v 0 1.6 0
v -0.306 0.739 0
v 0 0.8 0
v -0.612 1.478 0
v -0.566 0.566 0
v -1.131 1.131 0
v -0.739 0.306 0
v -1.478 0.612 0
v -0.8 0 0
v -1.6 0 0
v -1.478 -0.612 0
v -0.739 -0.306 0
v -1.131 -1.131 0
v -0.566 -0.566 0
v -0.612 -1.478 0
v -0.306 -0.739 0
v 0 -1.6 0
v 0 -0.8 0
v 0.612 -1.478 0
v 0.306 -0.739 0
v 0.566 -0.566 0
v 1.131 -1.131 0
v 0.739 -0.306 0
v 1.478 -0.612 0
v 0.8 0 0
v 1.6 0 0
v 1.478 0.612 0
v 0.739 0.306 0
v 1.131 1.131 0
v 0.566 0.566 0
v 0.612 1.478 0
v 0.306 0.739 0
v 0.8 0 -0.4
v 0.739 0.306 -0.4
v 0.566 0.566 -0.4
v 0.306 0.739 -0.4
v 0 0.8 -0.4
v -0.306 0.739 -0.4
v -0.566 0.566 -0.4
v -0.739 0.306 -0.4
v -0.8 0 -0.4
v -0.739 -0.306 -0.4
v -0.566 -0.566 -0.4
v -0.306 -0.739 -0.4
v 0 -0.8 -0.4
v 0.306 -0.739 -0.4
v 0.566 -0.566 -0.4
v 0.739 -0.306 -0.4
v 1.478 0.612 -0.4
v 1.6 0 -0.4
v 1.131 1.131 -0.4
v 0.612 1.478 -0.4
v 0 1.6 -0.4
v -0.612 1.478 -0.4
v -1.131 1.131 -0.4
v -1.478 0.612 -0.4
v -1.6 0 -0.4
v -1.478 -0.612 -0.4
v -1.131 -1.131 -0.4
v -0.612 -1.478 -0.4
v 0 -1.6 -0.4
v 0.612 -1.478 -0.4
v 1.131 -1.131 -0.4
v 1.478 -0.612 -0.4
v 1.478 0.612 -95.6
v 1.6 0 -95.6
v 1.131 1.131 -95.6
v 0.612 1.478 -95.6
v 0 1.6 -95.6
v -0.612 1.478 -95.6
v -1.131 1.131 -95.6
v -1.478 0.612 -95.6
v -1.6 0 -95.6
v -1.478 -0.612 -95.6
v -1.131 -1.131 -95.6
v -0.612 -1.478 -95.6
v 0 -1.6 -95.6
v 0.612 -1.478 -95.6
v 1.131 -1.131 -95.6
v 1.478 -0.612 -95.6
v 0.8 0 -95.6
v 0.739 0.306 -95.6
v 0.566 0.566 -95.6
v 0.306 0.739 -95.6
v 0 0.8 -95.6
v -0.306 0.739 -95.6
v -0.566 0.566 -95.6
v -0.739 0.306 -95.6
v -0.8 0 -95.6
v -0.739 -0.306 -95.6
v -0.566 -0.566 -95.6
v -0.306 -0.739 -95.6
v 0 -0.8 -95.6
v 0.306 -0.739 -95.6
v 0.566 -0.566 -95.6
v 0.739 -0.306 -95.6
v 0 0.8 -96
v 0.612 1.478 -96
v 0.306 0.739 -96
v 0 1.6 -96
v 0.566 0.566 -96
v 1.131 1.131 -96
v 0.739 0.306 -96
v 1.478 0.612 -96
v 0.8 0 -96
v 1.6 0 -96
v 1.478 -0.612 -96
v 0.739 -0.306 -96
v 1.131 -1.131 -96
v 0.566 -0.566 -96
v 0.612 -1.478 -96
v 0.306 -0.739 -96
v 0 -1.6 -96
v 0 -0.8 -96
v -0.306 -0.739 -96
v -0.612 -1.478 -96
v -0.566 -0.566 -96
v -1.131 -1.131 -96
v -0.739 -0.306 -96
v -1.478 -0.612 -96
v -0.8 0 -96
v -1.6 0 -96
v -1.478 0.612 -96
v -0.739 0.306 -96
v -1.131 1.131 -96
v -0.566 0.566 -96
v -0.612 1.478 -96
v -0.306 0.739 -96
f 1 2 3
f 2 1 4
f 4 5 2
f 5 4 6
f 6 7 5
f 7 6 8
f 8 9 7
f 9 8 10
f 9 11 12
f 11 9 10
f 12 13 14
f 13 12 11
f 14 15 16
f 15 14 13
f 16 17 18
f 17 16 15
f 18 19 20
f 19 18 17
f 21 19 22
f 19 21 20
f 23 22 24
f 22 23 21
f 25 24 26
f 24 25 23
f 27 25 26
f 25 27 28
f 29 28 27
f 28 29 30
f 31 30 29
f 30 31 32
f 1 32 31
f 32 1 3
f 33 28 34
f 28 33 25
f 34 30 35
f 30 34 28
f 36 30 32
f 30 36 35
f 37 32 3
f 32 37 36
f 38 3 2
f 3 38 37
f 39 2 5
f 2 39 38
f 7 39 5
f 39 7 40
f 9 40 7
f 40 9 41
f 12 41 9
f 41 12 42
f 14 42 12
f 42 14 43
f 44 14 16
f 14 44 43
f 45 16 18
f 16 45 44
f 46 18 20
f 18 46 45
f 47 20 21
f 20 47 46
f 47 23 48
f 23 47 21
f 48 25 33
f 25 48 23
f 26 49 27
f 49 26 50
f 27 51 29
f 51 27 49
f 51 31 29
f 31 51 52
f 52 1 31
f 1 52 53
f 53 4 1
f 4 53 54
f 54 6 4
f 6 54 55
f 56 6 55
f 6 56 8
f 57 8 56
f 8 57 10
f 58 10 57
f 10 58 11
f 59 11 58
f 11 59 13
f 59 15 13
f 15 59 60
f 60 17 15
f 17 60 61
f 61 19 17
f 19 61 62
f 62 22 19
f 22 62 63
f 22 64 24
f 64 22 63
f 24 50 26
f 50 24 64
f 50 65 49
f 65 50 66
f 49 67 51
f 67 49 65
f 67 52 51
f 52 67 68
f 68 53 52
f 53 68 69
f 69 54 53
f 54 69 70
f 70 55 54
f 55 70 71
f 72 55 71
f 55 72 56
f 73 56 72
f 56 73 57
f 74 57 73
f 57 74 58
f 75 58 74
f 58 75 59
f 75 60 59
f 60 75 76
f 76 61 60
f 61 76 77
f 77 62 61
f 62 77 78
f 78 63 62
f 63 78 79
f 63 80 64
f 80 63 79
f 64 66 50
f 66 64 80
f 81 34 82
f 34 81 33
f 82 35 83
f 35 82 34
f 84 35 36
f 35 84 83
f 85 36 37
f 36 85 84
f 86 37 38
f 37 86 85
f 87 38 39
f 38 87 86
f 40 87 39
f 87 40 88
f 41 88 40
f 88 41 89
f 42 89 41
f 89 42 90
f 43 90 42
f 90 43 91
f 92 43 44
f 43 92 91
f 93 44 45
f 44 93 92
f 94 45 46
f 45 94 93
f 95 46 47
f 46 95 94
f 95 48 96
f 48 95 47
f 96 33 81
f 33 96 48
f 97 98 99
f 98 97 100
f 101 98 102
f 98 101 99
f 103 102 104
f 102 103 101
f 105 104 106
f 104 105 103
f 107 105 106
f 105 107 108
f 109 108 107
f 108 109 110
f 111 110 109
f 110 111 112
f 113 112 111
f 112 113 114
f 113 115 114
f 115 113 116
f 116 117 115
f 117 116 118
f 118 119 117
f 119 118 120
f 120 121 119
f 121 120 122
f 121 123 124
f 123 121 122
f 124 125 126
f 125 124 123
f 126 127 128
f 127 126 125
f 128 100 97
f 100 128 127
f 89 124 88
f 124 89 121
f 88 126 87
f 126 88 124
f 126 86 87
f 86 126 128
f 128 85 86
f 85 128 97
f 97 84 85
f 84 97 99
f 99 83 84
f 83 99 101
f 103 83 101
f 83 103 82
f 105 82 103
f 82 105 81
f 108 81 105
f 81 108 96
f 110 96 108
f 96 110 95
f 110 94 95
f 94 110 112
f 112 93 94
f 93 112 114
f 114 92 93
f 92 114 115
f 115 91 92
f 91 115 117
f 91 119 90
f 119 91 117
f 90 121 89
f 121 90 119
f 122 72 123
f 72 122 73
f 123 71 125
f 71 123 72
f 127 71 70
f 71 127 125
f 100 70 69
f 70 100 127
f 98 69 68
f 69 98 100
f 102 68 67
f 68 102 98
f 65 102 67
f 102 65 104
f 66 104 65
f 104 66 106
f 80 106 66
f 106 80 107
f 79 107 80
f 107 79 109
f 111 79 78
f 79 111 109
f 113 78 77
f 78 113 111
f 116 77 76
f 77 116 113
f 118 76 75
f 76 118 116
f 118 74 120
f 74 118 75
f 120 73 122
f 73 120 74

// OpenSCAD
// file: ../p/4-4ring1.scad
use <../lib.scad>
function ldraw_lib__4_4ring1() = [
// 0 Ring  1 x 1.0
// 0 Name: 4-4ring1.dat
// 0 Author: James Jessiman
// 0 !LDRAW_ORG Primitive UPDATE 2009-01
// 0 !LICENSE Licensed under CC BY 2.0 and CC BY 4.0 : see CAreadme.txt
// 
// 0 BFC CERTIFY CCW
  [0,"BFC","CERTIFY"],
  [0,"BFC","CCW"],
// 
// 0 !HISTORY 1998-12-15 [PTadmin] Official Update 1998-10
// 0 !HISTORY 2002-04-08 [BrickCaster] Modified for BFC compliance
// 0 !HISTORY 2002-04-25 [PTadmin] Official Update 2002-02
// 0 !HISTORY 2007-06-24 [PTadmin] Header formatted for Contributor Agreement
// 0 !HISTORY 2008-07-01 [PTadmin] Official Update 2008-01
// 0 !HISTORY 2008-08-26 [cwdee] Switch polygon winding and rename
// 0 !HISTORY 2009-05-02 [PTadmin] Official Update 2009-01
// 
// 
// 4 16 -0.7654 0 1.8478 -0.3827 0 0.9239 0 0 1 0 0 2
  [4,16,-0.7654,0,1.8478,-0.3827,0,0.9239,0,0,1,0,0,2],
// 4 16 -1.4142 0 1.4142 -0.7071 0 0.7071 -0.3827 0 0.9239 -0.7654 0 1.8478
  [4,16,-1.4142,0,1.4142,-0.7071,0,0.7071,-0.3827,0,0.9239,-0.7654,0,1.8478],
// 4 16 -1.8478 0 0.7654 -0.9239 0 0.3827 -0.7071 0 0.7071 -1.4142 0 1.41420
  [4,16,-1.8478,0,0.7654,-0.9239,0,0.3827,-0.7071,0,0.7071,-1.4142,0,1.41420],
// 4 16 -2 0 0 -1 0 0 -0.9239 0 0.3827 -1.8478 0 0.7654
  [4,16,-2,0,0,-1,0,0,-0.9239,0,0.3827,-1.8478,0,0.7654],
// 4 16 -1.8478 0 -0.7654 -0.9239 0 -0.3827 -1 0 0 -2 0 0
  [4,16,-1.8478,0,-0.7654,-0.9239,0,-0.3827,-1,0,0,-2,0,0],
// 4 16 -1.4142 0 -1.4142 -0.7071 0 -0.7071 -0.9239 0 -0.3827 -1.8478 0 -0.7654
  [4,16,-1.4142,0,-1.4142,-0.7071,0,-0.7071,-0.9239,0,-0.3827,-1.8478,0,-0.7654],
// 4 16 -0.7654 0 -1.8478 -0.3827 0 -0.9239 -0.7071 0 -0.7071 -1.4142 0 -1.4142
  [4,16,-0.7654,0,-1.8478,-0.3827,0,-0.9239,-0.7071,0,-0.7071,-1.4142,0,-1.4142],
// 4 16 0 0 -2 0 0 -1 -0.3827 0 -0.9239 -0.7654 0 -1.8478
  [4,16,0,0,-2,0,0,-1,-0.3827,0,-0.9239,-0.7654,0,-1.8478],
// 4 16 0.7654 0 -1.8478 0.3827 0 -0.9239 0 0 -1 0 0 -2
  [4,16,0.7654,0,-1.8478,0.3827,0,-0.9239,0,0,-1,0,0,-2],
// 4 16 1.4142 0 -1.4142 0.7071 0 -0.7071 0.3827 0 -0.9239 0.7654 0 -1.8478
  [4,16,1.4142,0,-1.4142,0.7071,0,-0.7071,0.3827,0,-0.9239,0.7654,0,-1.8478],
// 4 16 1.8478 0 -0.7654 0.9239 0 -0.3827 0.7071 0 -0.7071 1.4142 0 -1.4142
  [4,16,1.8478,0,-0.7654,0.9239,0,-0.3827,0.7071,0,-0.7071,1.4142,0,-1.4142],
// 4 16 2 0 0 1 0 0 0.9239 0 -0.3827 1.8478 0 -0.7654
  [4,16,2,0,0,1,0,0,0.9239,0,-0.3827,1.8478,0,-0.7654],
// 4 16 1.8478 0 0.7654 0.9239 0 0.3827 1 0 0 2 0 0
  [4,16,1.8478,0,0.7654,0.9239,0,0.3827,1,0,0,2,0,0],
// 4 16 1.4142 0 1.4142 0.7071 0 0.7071 0.9239 0 0.3827 1.8478 0 0.7654
  [4,16,1.4142,0,1.4142,0.7071,0,0.7071,0.9239,0,0.3827,1.8478,0,0.7654],
// 4 16 0.7654 0 1.8478 0.3827 0 0.9239 0.7071 0 0.7071 1.4142 0 1.4142
  [4,16,0.7654,0,1.8478,0.3827,0,0.9239,0.7071,0,0.7071,1.4142,0,1.4142],
// 4 16 0 0 2 0 0 1 0.3827 0 0.9239 0.7654 0 1.8478
  [4,16,0,0,2,0,0,1,0.3827,0,0.9239,0.7654,0,1.8478],
// 0
];
module ldraw_lib__4_4ring1(step=0, col=false, unit=2/5, alt=false, line=0.2, solid=!$preview)
    makepoly(ldraw_lib__4_4ring1(), step=step, col=col, unit=unit, alt=alt, line=line, solid=solid);
ldraw_lib__4_4ring1(line=0.2);
// file: ../p/4-4edge.scad
use <../lib.scad>
function ldraw_lib__4_4edge() = [
// 0 Circle 1.0
// 0 Name: 4-4edge.dat
// 0 Author: James Jessiman
// 0 !LDRAW_ORG Primitive UPDATE 2017-01
// 0 !LICENSE Licensed under CC BY 2.0 and CC BY 4.0 : see CAreadme.txt
// 
// 0 BFC CERTIFY CCW
  [0,"BFC","CERTIFY"],
  [0,"BFC","CCW"],
// 
// 0 !HISTORY 1998-12-15 [PTadmin] Official Update 1998-10
// 0 !HISTORY 2005-12-28 [PTadmin] Official Update 2005-01
// 0 !HISTORY 2007-06-24 [PTadmin] Header formatted for Contributor Agreement
// 0 !HISTORY 2008-07-01 [PTadmin] Official Update 2008-01
// 0 !HISTORY 2017-01-15 [Steffen] BFCed
// 0 !HISTORY 2017-12-30 [PTadmin] Official Update 2017-01
// 
// 
// 2 24 1 0 0 0.9239 0 0.3827
  [2,24,1,0,0,0.9239,0,0.3827],
// 2 24 0.9239 0 0.3827 0.7071 0 0.7071
  [2,24,0.9239,0,0.3827,0.7071,0,0.7071],
// 2 24 0.7071 0 0.7071 0.3827 0 0.9239
  [2,24,0.7071,0,0.7071,0.3827,0,0.9239],
// 2 24 0.3827 0 0.9239 0 0 1
  [2,24,0.3827,0,0.9239,0,0,1],
// 2 24 0 0 1 -0.3827 0 0.9239
  [2,24,0,0,1,-0.3827,0,0.9239],
// 2 24 -0.3827 0 0.9239 -0.7071 0 0.7071
  [2,24,-0.3827,0,0.9239,-0.7071,0,0.7071],
// 2 24 -0.7071 0 0.7071 -0.9239 0 0.3827
  [2,24,-0.7071,0,0.7071,-0.9239,0,0.3827],
// 2 24 -0.9239 0 0.3827 -1 0 -0
  [2,24,-0.9239,0,0.3827,-1,0,-0],
// 2 24 -1 0 -0 -0.9239 0 -0.3827
  [2,24,-1,0,-0,-0.9239,0,-0.3827],
// 2 24 -0.9239 0 -0.3827 -0.7071 0 -0.7071
  [2,24,-0.9239,0,-0.3827,-0.7071,0,-0.7071],
// 2 24 -0.7071 0 -0.7071 -0.3827 0 -0.9239
  [2,24,-0.7071,0,-0.7071,-0.3827,0,-0.9239],
// 2 24 -0.3827 0 -0.9239 0 0 -1
  [2,24,-0.3827,0,-0.9239,0,0,-1],
// 2 24 0 0 -1 0.3827 0 -0.9239
  [2,24,0,0,-1,0.3827,0,-0.9239],
// 2 24 0.3827 0 -0.9239 0.7071 0 -0.7071
  [2,24,0.3827,0,-0.9239,0.7071,0,-0.7071],
// 2 24 0.7071 0 -0.7071 0.9239 0 -0.3827
  [2,24,0.7071,0,-0.7071,0.9239,0,-0.3827],
// 2 24 0.9239 0 -0.3827 1 0 0
  [2,24,0.9239,0,-0.3827,1,0,0],
];
module ldraw_lib__4_4edge(step=0, col=false, unit=2/5, alt=false, line=0.2, solid=!$preview)
    makepoly(ldraw_lib__4_4edge(), step=step, col=col, unit=unit, alt=alt, line=line, solid=solid);
ldraw_lib__4_4edge(line=0.2);
// file: ../p/4-4cyli.scad
use <../lib.scad>
function ldraw_lib__4_4cyli() = [
// 0 Cylinder 1.0
// 0 Name: 4-4cyli.dat
// 0 Author: James Jessiman
// 0 !LDRAW_ORG Primitive UPDATE 2005-01
// 0 !LICENSE Licensed under CC BY 2.0 and CC BY 4.0 : see CAreadme.txt
// 
// 0 BFC CERTIFY CCW
  [0,"BFC","CERTIFY"],
  [0,"BFC","CCW"],
// 
// 0 !HISTORY 1998-12-15 [PTadmin] Official Update 1998-10
// 0 !HISTORY 2002-03-23 [sbliss] Added BFC statement; merged headers from files in distributions LDraw 0.27 and Complete.
// 0 !HISTORY 2002-04-25 [PTadmin] Official Update 2002-02
// 0 !HISTORY 2004-12-14 [guyvivan] BFC CCW
// 0 !HISTORY 2005-12-28 [PTadmin] Official Update 2005-01
// 0 !HISTORY 2007-06-24 [PTadmin] Header formatted for Contributor Agreement
// 0 !HISTORY 2008-07-01 [PTadmin] Official Update 2008-01
// 
// 
// 4 16 1 1 0 0.9239 1 0.3827 0.9239 0 0.3827 1 0 0
  [4,16,1,1,0,0.9239,1,0.3827,0.9239,0,0.3827,1,0,0],
// 5 24 1 0 0 1 1 0 0.9239 0 0.3827 0.9239 0 -0.3827
  [5,24,1,0,0,1,1,0,0.9239,0,0.3827,0.9239,0,-0.3827],
// 4 16 0.9239 1 0.3827 0.7071 1 0.7071 0.7071 0 0.7071 0.9239 0 0.3827
  [4,16,0.9239,1,0.3827,0.7071,1,0.7071,0.7071,0,0.7071,0.9239,0,0.3827],
// 5 24 0.9239 0 0.3827 0.9239 1 0.3827 0.7071 0 0.7071 1 0 0
  [5,24,0.9239,0,0.3827,0.9239,1,0.3827,0.7071,0,0.7071,1,0,0],
// 4 16 0.7071 1 0.7071 0.3827 1 0.9239 0.3827 0 0.9239 0.7071 0 0.7071
  [4,16,0.7071,1,0.7071,0.3827,1,0.9239,0.3827,0,0.9239,0.7071,0,0.7071],
// 5 24 0.7071 0 0.7071 0.7071 1 0.7071 0.3827 0 0.9239 0.9239 0 0.3827
  [5,24,0.7071,0,0.7071,0.7071,1,0.7071,0.3827,0,0.9239,0.9239,0,0.3827],
// 4 16 0.3827 1 0.9239 0 1 1 0 0 1 0.3827 0 0.9239
  [4,16,0.3827,1,0.9239,0,1,1,0,0,1,0.3827,0,0.9239],
// 5 24 0.3827 0 0.9239 0.3827 1 0.9239 0 0 1 0.7071 0 0.7071
  [5,24,0.3827,0,0.9239,0.3827,1,0.9239,0,0,1,0.7071,0,0.7071],
// 4 16 0 1 1 -0.3827 1 0.9239 -0.3827 0 0.9239 0 0 1
  [4,16,0,1,1,-0.3827,1,0.9239,-0.3827,0,0.9239,0,0,1],
// 5 24 0 0 1 0 1 1 -0.3827 0 0.9239 0.3827 0 0.9239
  [5,24,0,0,1,0,1,1,-0.3827,0,0.9239,0.3827,0,0.9239],
// 4 16 -0.3827 1 0.9239 -0.7071 1 0.7071 -0.7071 0 0.7071 -0.3827 0 0.9239
  [4,16,-0.3827,1,0.9239,-0.7071,1,0.7071,-0.7071,0,0.7071,-0.3827,0,0.9239],
// 5 24 -0.3827 0 0.9239 -0.3827 1 0.9239 -0.7071 0 0.7071 0 0 1
  [5,24,-0.3827,0,0.9239,-0.3827,1,0.9239,-0.7071,0,0.7071,0,0,1],
// 4 16 -0.7071 1 0.7071 -0.9239 1 0.3827 -0.9239 0 0.3827 -0.7071 0 0.7071
  [4,16,-0.7071,1,0.7071,-0.9239,1,0.3827,-0.9239,0,0.3827,-0.7071,0,0.7071],
// 5 24 -0.7071 0 0.7071 -0.7071 1 0.7071 -0.9239 0 0.3827 -0.3827 0 0.9239
  [5,24,-0.7071,0,0.7071,-0.7071,1,0.7071,-0.9239,0,0.3827,-0.3827,0,0.9239],
// 4 16 -0.9239 1 0.3827 -1 1 0 -1 0 0 -0.9239 0 0.3827
  [4,16,-0.9239,1,0.3827,-1,1,0,-1,0,0,-0.9239,0,0.3827],
// 5 24 -0.9239 0 0.3827 -0.9239 1 0.3827 -1 0 0 -0.7071 0 0.7071
  [5,24,-0.9239,0,0.3827,-0.9239,1,0.3827,-1,0,0,-0.7071,0,0.7071],
// 4 16 -1 1 0 -0.9239 1 -0.3827 -0.9239 0 -0.3827 -1 0 0
  [4,16,-1,1,0,-0.9239,1,-0.3827,-0.9239,0,-0.3827,-1,0,0],
// 5 24 -1 0 0 -1 1 0 -0.9239 0 -0.3827 -0.9239 0 0.3827
  [5,24,-1,0,0,-1,1,0,-0.9239,0,-0.3827,-0.9239,0,0.3827],
// 4 16 -0.9239 1 -0.3827 -0.7071 1 -0.7071 -0.7071 0 -0.7071 -0.9239 0 -0.3827
  [4,16,-0.9239,1,-0.3827,-0.7071,1,-0.7071,-0.7071,0,-0.7071,-0.9239,0,-0.3827],
// 5 24 -0.9239 0 -0.3827 -0.9239 1 -0.3827 -0.7071 0 -0.7071 -1 0 0
  [5,24,-0.9239,0,-0.3827,-0.9239,1,-0.3827,-0.7071,0,-0.7071,-1,0,0],
// 4 16 -0.7071 1 -0.7071 -0.3827 1 -0.9239 -0.3827 0 -0.9239 -0.7071 0 -0.7071
  [4,16,-0.7071,1,-0.7071,-0.3827,1,-0.9239,-0.3827,0,-0.9239,-0.7071,0,-0.7071],
// 5 24 -0.7071 0 -0.7071 -0.7071 1 -0.7071 -0.3827 0 -0.9239 -0.9239 0 -0.3827
  [5,24,-0.7071,0,-0.7071,-0.7071,1,-0.7071,-0.3827,0,-0.9239,-0.9239,0,-0.3827],
// 4 16 -0.3827 1 -0.9239 0 1 -1 0 0 -1 -0.3827 0 -0.9239
  [4,16,-0.3827,1,-0.9239,0,1,-1,0,0,-1,-0.3827,0,-0.9239],
// 5 24 -0.3827 0 -0.9239 -0.3827 1 -0.9239 0 0 -1 -0.7071 0 -0.7071
  [5,24,-0.3827,0,-0.9239,-0.3827,1,-0.9239,0,0,-1,-0.7071,0,-0.7071],
// 4 16 0 1 -1 0.3827 1 -0.9239 0.3827 0 -0.9239 0 0 -1
  [4,16,0,1,-1,0.3827,1,-0.9239,0.3827,0,-0.9239,0,0,-1],
// 5 24 0 0 -1 0 1 -1 0.3827 0 -0.9239 -0.3827 0 -0.9239
  [5,24,0,0,-1,0,1,-1,0.3827,0,-0.9239,-0.3827,0,-0.9239],
// 4 16 0.3827 1 -0.9239 0.7071 1 -0.7071 0.7071 0 -0.7071 0.3827 0 -0.9239
  [4,16,0.3827,1,-0.9239,0.7071,1,-0.7071,0.7071,0,-0.7071,0.3827,0,-0.9239],
// 5 24 0.3827 0 -0.9239 0.3827 1 -0.9239 0.7071 0 -0.7071 0 0 -1
  [5,24,0.3827,0,-0.9239,0.3827,1,-0.9239,0.7071,0,-0.7071,0,0,-1],
// 4 16 0.7071 1 -0.7071 0.9239 1 -0.3827 0.9239 0 -0.3827 0.7071 0 -0.7071
  [4,16,0.7071,1,-0.7071,0.9239,1,-0.3827,0.9239,0,-0.3827,0.7071,0,-0.7071],
// 5 24 0.7071 0 -0.7071 0.7071 1 -0.7071 0.9239 0 -0.3827 0.3827 0 -0.9239
  [5,24,0.7071,0,-0.7071,0.7071,1,-0.7071,0.9239,0,-0.3827,0.3827,0,-0.9239],
// 4 16 0.9239 1 -0.3827 1 1 0 1 0 0 0.9239 0 -0.3827
  [4,16,0.9239,1,-0.3827,1,1,0,1,0,0,0.9239,0,-0.3827],
// 5 24 0.9239 0 -0.3827 0.9239 1 -0.3827 1 0 0 0.7071 0 -0.7071
  [5,24,0.9239,0,-0.3827,0.9239,1,-0.3827,1,0,0,0.7071,0,-0.7071],
// 0
];
module ldraw_lib__4_4cyli(step=0, col=false, unit=2/5, alt=false, line=0.2, solid=!$preview)
    makepoly(ldraw_lib__4_4cyli(), step=step, col=col, unit=unit, alt=alt, line=line, solid=solid);
ldraw_lib__4_4cyli(line=0.2);
// file: u9053.scad
use <../lib.scad>
use <../p/4-4cyli.scad>
use <../p/4-4edge.scad>
use <../p/4-4ring1.scad>
function ldraw_lib__u9053() = [
// 0 ~Technic Flex-System Hose End
// 0 Name: u9053.dat
// 0 Author: William Howard [WilliamH]
// 0 !LDRAW_ORG Part UPDATE 2011-02
// 0 !LICENSE Licensed under CC BY 2.0 and CC BY 4.0 : see CAreadme.txt
// 
// 0 BFC CERTIFY CCW
  [0,"BFC","CERTIFY"],
  [0,"BFC","CCW"],
// 
// 0 !HISTORY 2011-12-21 [cwdee] Reworked subparting technique
// 0 !HISTORY 2011-12-23 [PTadmin] Renamed from 76
// 0 !HISTORY 2011-12-29 [PTadmin] Official Update 2011-02
// 
// 
// 1 16 0 0 0 2 0 0 0 1 0 0 0 2 4-4ring1.dat
  [1,16,0,0,0,2,0,0,0,1,0,0,0,2, ldraw_lib__4_4ring1()],
// 1 16 0 0 0 2 0 0 0 1 0 0 0 2 4-4edge.dat
  [1,16,0,0,0,2,0,0,0,1,0,0,0,2, ldraw_lib__4_4edge()],
// 0 BFC INVERTNEXT
  [0,"BFC","INVERTNEXT"],
// 1 16 0 0 0 2 0 0 0 1 0 0 0 2 4-4cyli.dat
  [1,16,0,0,0,2,0,0,0,1,0,0,0,2, ldraw_lib__4_4cyli()],
// 1 16 0 0 0 4 0 0 0 1 0 0 0 4 4-4edge.dat
  [1,16,0,0,0,4,0,0,0,1,0,0,0,4, ldraw_lib__4_4edge()],
// 1 16 0 0 0 4 0 0 0 1 0 0 0 4 4-4cyli.dat
  [1,16,0,0,0,4,0,0,0,1,0,0,0,4, ldraw_lib__4_4cyli()],
// 0
];
module ldraw_lib__u9053(step=0, col=false, unit=2/5, alt=false, line=0.2, solid=!$preview)
    makepoly(ldraw_lib__u9053(), step=step, col=col, unit=unit, alt=alt, line=line, solid=solid);
ldraw_lib__u9053(line=0.2);
// file: 77.scad
use <../lib.scad>
use <../p/4-4cyli.scad>
function ldraw_lib__77() = [
// 0 ~Technic Flex-System Hose Segment
// 0 Name: 77.dat
// 0 Author: William Howard [WilliamH]
// 0 !LDRAW_ORG Part UPDATE 2011-02
// 0 !LICENSE Licensed under CC BY 2.0 and CC BY 4.0 : see CAreadme.txt
// 
// 0 BFC CERTIFY CCW
  [0,"BFC","CERTIFY"],
  [0,"BFC","CCW"],
// 
// 0 !HISTORY 2011-12-21 [cwdee] Reworked subparting technique
// 0 !HISTORY 2011-12-29 [PTadmin] Official Update 2011-02
// 
// 
// 1 16 0 0 0 4 0 0 0 1 0 0 0 4 4-4cyli.dat
  [1,16,0,0,0,4,0,0,0,1,0,0,0,4, ldraw_lib__4_4cyli()],
// 0 BFC INVERTNEXT
  [0,"BFC","INVERTNEXT"],
// 1 16 0 0 0 2 0 0 0 1 0 0 0 2 4-4cyli.dat
  [1,16,0,0,0,2,0,0,0,1,0,0,0,2, ldraw_lib__4_4cyli()],
// 0
];
module ldraw_lib__77(step=0, col=false, unit=2/5, alt=false, line=0.2, solid=!$preview)
    makepoly(ldraw_lib__77(), step=step, col=col, unit=unit, alt=alt, line=line, solid=solid);
ldraw_lib__77(line=0.2);
// main file
use <../lib.scad>
use <77.scad>
use <u9053.scad>
function ldraw_lib__71175() = [
// 0 Technic Flex-System Hose 12L (240LDU)
// 0 Name: 71175.dat
// 0 Author: Tim Gould [timgould]
// 0 !LDRAW_ORG Part UPDATE 2011-02
// 0 !LICENSE Licensed under CC BY 2.0 and CC BY 4.0 : see CAreadme.txt
// 
// 0 BFC CERTIFY CCW
  [0,"BFC","CERTIFY"],
  [0,"BFC","CCW"],
// 
// 0 !KEYWORDS bar, tube
// 
// 0 !HISTORY 2011-12-29 [PTadmin] Official Update 2011-02
// 
// 
// 1 16 0 0 0 1 0 0 0 1 0 0 0 1 u9053.dat
  [1,16,0,0,0,1,0,0,0,1,0,0,0,1, ldraw_lib__u9053()],
// 1 16 0 1 0 1 0 0 0 238 0 0 0 1 77.dat
  [1,16,0,1,0,1,0,0,0,238,0,0,0,1, ldraw_lib__77()],
// 1 16 0 240 0 -1 0 0 0 -1 0 0 0 1 u9053.dat
  [1,16,0,240,0,-1,0,0,0,-1,0,0,0,1, ldraw_lib__u9053()],
];
module ldraw_lib__71175(step=0, col=false, unit=2/5, alt=false, line=0.2, solid=!$preview)
    makepoly(ldraw_lib__71175(), step=step, col=col, unit=unit, alt=alt, line=line, solid=solid);
ldraw_lib__71175(line=0.2);
